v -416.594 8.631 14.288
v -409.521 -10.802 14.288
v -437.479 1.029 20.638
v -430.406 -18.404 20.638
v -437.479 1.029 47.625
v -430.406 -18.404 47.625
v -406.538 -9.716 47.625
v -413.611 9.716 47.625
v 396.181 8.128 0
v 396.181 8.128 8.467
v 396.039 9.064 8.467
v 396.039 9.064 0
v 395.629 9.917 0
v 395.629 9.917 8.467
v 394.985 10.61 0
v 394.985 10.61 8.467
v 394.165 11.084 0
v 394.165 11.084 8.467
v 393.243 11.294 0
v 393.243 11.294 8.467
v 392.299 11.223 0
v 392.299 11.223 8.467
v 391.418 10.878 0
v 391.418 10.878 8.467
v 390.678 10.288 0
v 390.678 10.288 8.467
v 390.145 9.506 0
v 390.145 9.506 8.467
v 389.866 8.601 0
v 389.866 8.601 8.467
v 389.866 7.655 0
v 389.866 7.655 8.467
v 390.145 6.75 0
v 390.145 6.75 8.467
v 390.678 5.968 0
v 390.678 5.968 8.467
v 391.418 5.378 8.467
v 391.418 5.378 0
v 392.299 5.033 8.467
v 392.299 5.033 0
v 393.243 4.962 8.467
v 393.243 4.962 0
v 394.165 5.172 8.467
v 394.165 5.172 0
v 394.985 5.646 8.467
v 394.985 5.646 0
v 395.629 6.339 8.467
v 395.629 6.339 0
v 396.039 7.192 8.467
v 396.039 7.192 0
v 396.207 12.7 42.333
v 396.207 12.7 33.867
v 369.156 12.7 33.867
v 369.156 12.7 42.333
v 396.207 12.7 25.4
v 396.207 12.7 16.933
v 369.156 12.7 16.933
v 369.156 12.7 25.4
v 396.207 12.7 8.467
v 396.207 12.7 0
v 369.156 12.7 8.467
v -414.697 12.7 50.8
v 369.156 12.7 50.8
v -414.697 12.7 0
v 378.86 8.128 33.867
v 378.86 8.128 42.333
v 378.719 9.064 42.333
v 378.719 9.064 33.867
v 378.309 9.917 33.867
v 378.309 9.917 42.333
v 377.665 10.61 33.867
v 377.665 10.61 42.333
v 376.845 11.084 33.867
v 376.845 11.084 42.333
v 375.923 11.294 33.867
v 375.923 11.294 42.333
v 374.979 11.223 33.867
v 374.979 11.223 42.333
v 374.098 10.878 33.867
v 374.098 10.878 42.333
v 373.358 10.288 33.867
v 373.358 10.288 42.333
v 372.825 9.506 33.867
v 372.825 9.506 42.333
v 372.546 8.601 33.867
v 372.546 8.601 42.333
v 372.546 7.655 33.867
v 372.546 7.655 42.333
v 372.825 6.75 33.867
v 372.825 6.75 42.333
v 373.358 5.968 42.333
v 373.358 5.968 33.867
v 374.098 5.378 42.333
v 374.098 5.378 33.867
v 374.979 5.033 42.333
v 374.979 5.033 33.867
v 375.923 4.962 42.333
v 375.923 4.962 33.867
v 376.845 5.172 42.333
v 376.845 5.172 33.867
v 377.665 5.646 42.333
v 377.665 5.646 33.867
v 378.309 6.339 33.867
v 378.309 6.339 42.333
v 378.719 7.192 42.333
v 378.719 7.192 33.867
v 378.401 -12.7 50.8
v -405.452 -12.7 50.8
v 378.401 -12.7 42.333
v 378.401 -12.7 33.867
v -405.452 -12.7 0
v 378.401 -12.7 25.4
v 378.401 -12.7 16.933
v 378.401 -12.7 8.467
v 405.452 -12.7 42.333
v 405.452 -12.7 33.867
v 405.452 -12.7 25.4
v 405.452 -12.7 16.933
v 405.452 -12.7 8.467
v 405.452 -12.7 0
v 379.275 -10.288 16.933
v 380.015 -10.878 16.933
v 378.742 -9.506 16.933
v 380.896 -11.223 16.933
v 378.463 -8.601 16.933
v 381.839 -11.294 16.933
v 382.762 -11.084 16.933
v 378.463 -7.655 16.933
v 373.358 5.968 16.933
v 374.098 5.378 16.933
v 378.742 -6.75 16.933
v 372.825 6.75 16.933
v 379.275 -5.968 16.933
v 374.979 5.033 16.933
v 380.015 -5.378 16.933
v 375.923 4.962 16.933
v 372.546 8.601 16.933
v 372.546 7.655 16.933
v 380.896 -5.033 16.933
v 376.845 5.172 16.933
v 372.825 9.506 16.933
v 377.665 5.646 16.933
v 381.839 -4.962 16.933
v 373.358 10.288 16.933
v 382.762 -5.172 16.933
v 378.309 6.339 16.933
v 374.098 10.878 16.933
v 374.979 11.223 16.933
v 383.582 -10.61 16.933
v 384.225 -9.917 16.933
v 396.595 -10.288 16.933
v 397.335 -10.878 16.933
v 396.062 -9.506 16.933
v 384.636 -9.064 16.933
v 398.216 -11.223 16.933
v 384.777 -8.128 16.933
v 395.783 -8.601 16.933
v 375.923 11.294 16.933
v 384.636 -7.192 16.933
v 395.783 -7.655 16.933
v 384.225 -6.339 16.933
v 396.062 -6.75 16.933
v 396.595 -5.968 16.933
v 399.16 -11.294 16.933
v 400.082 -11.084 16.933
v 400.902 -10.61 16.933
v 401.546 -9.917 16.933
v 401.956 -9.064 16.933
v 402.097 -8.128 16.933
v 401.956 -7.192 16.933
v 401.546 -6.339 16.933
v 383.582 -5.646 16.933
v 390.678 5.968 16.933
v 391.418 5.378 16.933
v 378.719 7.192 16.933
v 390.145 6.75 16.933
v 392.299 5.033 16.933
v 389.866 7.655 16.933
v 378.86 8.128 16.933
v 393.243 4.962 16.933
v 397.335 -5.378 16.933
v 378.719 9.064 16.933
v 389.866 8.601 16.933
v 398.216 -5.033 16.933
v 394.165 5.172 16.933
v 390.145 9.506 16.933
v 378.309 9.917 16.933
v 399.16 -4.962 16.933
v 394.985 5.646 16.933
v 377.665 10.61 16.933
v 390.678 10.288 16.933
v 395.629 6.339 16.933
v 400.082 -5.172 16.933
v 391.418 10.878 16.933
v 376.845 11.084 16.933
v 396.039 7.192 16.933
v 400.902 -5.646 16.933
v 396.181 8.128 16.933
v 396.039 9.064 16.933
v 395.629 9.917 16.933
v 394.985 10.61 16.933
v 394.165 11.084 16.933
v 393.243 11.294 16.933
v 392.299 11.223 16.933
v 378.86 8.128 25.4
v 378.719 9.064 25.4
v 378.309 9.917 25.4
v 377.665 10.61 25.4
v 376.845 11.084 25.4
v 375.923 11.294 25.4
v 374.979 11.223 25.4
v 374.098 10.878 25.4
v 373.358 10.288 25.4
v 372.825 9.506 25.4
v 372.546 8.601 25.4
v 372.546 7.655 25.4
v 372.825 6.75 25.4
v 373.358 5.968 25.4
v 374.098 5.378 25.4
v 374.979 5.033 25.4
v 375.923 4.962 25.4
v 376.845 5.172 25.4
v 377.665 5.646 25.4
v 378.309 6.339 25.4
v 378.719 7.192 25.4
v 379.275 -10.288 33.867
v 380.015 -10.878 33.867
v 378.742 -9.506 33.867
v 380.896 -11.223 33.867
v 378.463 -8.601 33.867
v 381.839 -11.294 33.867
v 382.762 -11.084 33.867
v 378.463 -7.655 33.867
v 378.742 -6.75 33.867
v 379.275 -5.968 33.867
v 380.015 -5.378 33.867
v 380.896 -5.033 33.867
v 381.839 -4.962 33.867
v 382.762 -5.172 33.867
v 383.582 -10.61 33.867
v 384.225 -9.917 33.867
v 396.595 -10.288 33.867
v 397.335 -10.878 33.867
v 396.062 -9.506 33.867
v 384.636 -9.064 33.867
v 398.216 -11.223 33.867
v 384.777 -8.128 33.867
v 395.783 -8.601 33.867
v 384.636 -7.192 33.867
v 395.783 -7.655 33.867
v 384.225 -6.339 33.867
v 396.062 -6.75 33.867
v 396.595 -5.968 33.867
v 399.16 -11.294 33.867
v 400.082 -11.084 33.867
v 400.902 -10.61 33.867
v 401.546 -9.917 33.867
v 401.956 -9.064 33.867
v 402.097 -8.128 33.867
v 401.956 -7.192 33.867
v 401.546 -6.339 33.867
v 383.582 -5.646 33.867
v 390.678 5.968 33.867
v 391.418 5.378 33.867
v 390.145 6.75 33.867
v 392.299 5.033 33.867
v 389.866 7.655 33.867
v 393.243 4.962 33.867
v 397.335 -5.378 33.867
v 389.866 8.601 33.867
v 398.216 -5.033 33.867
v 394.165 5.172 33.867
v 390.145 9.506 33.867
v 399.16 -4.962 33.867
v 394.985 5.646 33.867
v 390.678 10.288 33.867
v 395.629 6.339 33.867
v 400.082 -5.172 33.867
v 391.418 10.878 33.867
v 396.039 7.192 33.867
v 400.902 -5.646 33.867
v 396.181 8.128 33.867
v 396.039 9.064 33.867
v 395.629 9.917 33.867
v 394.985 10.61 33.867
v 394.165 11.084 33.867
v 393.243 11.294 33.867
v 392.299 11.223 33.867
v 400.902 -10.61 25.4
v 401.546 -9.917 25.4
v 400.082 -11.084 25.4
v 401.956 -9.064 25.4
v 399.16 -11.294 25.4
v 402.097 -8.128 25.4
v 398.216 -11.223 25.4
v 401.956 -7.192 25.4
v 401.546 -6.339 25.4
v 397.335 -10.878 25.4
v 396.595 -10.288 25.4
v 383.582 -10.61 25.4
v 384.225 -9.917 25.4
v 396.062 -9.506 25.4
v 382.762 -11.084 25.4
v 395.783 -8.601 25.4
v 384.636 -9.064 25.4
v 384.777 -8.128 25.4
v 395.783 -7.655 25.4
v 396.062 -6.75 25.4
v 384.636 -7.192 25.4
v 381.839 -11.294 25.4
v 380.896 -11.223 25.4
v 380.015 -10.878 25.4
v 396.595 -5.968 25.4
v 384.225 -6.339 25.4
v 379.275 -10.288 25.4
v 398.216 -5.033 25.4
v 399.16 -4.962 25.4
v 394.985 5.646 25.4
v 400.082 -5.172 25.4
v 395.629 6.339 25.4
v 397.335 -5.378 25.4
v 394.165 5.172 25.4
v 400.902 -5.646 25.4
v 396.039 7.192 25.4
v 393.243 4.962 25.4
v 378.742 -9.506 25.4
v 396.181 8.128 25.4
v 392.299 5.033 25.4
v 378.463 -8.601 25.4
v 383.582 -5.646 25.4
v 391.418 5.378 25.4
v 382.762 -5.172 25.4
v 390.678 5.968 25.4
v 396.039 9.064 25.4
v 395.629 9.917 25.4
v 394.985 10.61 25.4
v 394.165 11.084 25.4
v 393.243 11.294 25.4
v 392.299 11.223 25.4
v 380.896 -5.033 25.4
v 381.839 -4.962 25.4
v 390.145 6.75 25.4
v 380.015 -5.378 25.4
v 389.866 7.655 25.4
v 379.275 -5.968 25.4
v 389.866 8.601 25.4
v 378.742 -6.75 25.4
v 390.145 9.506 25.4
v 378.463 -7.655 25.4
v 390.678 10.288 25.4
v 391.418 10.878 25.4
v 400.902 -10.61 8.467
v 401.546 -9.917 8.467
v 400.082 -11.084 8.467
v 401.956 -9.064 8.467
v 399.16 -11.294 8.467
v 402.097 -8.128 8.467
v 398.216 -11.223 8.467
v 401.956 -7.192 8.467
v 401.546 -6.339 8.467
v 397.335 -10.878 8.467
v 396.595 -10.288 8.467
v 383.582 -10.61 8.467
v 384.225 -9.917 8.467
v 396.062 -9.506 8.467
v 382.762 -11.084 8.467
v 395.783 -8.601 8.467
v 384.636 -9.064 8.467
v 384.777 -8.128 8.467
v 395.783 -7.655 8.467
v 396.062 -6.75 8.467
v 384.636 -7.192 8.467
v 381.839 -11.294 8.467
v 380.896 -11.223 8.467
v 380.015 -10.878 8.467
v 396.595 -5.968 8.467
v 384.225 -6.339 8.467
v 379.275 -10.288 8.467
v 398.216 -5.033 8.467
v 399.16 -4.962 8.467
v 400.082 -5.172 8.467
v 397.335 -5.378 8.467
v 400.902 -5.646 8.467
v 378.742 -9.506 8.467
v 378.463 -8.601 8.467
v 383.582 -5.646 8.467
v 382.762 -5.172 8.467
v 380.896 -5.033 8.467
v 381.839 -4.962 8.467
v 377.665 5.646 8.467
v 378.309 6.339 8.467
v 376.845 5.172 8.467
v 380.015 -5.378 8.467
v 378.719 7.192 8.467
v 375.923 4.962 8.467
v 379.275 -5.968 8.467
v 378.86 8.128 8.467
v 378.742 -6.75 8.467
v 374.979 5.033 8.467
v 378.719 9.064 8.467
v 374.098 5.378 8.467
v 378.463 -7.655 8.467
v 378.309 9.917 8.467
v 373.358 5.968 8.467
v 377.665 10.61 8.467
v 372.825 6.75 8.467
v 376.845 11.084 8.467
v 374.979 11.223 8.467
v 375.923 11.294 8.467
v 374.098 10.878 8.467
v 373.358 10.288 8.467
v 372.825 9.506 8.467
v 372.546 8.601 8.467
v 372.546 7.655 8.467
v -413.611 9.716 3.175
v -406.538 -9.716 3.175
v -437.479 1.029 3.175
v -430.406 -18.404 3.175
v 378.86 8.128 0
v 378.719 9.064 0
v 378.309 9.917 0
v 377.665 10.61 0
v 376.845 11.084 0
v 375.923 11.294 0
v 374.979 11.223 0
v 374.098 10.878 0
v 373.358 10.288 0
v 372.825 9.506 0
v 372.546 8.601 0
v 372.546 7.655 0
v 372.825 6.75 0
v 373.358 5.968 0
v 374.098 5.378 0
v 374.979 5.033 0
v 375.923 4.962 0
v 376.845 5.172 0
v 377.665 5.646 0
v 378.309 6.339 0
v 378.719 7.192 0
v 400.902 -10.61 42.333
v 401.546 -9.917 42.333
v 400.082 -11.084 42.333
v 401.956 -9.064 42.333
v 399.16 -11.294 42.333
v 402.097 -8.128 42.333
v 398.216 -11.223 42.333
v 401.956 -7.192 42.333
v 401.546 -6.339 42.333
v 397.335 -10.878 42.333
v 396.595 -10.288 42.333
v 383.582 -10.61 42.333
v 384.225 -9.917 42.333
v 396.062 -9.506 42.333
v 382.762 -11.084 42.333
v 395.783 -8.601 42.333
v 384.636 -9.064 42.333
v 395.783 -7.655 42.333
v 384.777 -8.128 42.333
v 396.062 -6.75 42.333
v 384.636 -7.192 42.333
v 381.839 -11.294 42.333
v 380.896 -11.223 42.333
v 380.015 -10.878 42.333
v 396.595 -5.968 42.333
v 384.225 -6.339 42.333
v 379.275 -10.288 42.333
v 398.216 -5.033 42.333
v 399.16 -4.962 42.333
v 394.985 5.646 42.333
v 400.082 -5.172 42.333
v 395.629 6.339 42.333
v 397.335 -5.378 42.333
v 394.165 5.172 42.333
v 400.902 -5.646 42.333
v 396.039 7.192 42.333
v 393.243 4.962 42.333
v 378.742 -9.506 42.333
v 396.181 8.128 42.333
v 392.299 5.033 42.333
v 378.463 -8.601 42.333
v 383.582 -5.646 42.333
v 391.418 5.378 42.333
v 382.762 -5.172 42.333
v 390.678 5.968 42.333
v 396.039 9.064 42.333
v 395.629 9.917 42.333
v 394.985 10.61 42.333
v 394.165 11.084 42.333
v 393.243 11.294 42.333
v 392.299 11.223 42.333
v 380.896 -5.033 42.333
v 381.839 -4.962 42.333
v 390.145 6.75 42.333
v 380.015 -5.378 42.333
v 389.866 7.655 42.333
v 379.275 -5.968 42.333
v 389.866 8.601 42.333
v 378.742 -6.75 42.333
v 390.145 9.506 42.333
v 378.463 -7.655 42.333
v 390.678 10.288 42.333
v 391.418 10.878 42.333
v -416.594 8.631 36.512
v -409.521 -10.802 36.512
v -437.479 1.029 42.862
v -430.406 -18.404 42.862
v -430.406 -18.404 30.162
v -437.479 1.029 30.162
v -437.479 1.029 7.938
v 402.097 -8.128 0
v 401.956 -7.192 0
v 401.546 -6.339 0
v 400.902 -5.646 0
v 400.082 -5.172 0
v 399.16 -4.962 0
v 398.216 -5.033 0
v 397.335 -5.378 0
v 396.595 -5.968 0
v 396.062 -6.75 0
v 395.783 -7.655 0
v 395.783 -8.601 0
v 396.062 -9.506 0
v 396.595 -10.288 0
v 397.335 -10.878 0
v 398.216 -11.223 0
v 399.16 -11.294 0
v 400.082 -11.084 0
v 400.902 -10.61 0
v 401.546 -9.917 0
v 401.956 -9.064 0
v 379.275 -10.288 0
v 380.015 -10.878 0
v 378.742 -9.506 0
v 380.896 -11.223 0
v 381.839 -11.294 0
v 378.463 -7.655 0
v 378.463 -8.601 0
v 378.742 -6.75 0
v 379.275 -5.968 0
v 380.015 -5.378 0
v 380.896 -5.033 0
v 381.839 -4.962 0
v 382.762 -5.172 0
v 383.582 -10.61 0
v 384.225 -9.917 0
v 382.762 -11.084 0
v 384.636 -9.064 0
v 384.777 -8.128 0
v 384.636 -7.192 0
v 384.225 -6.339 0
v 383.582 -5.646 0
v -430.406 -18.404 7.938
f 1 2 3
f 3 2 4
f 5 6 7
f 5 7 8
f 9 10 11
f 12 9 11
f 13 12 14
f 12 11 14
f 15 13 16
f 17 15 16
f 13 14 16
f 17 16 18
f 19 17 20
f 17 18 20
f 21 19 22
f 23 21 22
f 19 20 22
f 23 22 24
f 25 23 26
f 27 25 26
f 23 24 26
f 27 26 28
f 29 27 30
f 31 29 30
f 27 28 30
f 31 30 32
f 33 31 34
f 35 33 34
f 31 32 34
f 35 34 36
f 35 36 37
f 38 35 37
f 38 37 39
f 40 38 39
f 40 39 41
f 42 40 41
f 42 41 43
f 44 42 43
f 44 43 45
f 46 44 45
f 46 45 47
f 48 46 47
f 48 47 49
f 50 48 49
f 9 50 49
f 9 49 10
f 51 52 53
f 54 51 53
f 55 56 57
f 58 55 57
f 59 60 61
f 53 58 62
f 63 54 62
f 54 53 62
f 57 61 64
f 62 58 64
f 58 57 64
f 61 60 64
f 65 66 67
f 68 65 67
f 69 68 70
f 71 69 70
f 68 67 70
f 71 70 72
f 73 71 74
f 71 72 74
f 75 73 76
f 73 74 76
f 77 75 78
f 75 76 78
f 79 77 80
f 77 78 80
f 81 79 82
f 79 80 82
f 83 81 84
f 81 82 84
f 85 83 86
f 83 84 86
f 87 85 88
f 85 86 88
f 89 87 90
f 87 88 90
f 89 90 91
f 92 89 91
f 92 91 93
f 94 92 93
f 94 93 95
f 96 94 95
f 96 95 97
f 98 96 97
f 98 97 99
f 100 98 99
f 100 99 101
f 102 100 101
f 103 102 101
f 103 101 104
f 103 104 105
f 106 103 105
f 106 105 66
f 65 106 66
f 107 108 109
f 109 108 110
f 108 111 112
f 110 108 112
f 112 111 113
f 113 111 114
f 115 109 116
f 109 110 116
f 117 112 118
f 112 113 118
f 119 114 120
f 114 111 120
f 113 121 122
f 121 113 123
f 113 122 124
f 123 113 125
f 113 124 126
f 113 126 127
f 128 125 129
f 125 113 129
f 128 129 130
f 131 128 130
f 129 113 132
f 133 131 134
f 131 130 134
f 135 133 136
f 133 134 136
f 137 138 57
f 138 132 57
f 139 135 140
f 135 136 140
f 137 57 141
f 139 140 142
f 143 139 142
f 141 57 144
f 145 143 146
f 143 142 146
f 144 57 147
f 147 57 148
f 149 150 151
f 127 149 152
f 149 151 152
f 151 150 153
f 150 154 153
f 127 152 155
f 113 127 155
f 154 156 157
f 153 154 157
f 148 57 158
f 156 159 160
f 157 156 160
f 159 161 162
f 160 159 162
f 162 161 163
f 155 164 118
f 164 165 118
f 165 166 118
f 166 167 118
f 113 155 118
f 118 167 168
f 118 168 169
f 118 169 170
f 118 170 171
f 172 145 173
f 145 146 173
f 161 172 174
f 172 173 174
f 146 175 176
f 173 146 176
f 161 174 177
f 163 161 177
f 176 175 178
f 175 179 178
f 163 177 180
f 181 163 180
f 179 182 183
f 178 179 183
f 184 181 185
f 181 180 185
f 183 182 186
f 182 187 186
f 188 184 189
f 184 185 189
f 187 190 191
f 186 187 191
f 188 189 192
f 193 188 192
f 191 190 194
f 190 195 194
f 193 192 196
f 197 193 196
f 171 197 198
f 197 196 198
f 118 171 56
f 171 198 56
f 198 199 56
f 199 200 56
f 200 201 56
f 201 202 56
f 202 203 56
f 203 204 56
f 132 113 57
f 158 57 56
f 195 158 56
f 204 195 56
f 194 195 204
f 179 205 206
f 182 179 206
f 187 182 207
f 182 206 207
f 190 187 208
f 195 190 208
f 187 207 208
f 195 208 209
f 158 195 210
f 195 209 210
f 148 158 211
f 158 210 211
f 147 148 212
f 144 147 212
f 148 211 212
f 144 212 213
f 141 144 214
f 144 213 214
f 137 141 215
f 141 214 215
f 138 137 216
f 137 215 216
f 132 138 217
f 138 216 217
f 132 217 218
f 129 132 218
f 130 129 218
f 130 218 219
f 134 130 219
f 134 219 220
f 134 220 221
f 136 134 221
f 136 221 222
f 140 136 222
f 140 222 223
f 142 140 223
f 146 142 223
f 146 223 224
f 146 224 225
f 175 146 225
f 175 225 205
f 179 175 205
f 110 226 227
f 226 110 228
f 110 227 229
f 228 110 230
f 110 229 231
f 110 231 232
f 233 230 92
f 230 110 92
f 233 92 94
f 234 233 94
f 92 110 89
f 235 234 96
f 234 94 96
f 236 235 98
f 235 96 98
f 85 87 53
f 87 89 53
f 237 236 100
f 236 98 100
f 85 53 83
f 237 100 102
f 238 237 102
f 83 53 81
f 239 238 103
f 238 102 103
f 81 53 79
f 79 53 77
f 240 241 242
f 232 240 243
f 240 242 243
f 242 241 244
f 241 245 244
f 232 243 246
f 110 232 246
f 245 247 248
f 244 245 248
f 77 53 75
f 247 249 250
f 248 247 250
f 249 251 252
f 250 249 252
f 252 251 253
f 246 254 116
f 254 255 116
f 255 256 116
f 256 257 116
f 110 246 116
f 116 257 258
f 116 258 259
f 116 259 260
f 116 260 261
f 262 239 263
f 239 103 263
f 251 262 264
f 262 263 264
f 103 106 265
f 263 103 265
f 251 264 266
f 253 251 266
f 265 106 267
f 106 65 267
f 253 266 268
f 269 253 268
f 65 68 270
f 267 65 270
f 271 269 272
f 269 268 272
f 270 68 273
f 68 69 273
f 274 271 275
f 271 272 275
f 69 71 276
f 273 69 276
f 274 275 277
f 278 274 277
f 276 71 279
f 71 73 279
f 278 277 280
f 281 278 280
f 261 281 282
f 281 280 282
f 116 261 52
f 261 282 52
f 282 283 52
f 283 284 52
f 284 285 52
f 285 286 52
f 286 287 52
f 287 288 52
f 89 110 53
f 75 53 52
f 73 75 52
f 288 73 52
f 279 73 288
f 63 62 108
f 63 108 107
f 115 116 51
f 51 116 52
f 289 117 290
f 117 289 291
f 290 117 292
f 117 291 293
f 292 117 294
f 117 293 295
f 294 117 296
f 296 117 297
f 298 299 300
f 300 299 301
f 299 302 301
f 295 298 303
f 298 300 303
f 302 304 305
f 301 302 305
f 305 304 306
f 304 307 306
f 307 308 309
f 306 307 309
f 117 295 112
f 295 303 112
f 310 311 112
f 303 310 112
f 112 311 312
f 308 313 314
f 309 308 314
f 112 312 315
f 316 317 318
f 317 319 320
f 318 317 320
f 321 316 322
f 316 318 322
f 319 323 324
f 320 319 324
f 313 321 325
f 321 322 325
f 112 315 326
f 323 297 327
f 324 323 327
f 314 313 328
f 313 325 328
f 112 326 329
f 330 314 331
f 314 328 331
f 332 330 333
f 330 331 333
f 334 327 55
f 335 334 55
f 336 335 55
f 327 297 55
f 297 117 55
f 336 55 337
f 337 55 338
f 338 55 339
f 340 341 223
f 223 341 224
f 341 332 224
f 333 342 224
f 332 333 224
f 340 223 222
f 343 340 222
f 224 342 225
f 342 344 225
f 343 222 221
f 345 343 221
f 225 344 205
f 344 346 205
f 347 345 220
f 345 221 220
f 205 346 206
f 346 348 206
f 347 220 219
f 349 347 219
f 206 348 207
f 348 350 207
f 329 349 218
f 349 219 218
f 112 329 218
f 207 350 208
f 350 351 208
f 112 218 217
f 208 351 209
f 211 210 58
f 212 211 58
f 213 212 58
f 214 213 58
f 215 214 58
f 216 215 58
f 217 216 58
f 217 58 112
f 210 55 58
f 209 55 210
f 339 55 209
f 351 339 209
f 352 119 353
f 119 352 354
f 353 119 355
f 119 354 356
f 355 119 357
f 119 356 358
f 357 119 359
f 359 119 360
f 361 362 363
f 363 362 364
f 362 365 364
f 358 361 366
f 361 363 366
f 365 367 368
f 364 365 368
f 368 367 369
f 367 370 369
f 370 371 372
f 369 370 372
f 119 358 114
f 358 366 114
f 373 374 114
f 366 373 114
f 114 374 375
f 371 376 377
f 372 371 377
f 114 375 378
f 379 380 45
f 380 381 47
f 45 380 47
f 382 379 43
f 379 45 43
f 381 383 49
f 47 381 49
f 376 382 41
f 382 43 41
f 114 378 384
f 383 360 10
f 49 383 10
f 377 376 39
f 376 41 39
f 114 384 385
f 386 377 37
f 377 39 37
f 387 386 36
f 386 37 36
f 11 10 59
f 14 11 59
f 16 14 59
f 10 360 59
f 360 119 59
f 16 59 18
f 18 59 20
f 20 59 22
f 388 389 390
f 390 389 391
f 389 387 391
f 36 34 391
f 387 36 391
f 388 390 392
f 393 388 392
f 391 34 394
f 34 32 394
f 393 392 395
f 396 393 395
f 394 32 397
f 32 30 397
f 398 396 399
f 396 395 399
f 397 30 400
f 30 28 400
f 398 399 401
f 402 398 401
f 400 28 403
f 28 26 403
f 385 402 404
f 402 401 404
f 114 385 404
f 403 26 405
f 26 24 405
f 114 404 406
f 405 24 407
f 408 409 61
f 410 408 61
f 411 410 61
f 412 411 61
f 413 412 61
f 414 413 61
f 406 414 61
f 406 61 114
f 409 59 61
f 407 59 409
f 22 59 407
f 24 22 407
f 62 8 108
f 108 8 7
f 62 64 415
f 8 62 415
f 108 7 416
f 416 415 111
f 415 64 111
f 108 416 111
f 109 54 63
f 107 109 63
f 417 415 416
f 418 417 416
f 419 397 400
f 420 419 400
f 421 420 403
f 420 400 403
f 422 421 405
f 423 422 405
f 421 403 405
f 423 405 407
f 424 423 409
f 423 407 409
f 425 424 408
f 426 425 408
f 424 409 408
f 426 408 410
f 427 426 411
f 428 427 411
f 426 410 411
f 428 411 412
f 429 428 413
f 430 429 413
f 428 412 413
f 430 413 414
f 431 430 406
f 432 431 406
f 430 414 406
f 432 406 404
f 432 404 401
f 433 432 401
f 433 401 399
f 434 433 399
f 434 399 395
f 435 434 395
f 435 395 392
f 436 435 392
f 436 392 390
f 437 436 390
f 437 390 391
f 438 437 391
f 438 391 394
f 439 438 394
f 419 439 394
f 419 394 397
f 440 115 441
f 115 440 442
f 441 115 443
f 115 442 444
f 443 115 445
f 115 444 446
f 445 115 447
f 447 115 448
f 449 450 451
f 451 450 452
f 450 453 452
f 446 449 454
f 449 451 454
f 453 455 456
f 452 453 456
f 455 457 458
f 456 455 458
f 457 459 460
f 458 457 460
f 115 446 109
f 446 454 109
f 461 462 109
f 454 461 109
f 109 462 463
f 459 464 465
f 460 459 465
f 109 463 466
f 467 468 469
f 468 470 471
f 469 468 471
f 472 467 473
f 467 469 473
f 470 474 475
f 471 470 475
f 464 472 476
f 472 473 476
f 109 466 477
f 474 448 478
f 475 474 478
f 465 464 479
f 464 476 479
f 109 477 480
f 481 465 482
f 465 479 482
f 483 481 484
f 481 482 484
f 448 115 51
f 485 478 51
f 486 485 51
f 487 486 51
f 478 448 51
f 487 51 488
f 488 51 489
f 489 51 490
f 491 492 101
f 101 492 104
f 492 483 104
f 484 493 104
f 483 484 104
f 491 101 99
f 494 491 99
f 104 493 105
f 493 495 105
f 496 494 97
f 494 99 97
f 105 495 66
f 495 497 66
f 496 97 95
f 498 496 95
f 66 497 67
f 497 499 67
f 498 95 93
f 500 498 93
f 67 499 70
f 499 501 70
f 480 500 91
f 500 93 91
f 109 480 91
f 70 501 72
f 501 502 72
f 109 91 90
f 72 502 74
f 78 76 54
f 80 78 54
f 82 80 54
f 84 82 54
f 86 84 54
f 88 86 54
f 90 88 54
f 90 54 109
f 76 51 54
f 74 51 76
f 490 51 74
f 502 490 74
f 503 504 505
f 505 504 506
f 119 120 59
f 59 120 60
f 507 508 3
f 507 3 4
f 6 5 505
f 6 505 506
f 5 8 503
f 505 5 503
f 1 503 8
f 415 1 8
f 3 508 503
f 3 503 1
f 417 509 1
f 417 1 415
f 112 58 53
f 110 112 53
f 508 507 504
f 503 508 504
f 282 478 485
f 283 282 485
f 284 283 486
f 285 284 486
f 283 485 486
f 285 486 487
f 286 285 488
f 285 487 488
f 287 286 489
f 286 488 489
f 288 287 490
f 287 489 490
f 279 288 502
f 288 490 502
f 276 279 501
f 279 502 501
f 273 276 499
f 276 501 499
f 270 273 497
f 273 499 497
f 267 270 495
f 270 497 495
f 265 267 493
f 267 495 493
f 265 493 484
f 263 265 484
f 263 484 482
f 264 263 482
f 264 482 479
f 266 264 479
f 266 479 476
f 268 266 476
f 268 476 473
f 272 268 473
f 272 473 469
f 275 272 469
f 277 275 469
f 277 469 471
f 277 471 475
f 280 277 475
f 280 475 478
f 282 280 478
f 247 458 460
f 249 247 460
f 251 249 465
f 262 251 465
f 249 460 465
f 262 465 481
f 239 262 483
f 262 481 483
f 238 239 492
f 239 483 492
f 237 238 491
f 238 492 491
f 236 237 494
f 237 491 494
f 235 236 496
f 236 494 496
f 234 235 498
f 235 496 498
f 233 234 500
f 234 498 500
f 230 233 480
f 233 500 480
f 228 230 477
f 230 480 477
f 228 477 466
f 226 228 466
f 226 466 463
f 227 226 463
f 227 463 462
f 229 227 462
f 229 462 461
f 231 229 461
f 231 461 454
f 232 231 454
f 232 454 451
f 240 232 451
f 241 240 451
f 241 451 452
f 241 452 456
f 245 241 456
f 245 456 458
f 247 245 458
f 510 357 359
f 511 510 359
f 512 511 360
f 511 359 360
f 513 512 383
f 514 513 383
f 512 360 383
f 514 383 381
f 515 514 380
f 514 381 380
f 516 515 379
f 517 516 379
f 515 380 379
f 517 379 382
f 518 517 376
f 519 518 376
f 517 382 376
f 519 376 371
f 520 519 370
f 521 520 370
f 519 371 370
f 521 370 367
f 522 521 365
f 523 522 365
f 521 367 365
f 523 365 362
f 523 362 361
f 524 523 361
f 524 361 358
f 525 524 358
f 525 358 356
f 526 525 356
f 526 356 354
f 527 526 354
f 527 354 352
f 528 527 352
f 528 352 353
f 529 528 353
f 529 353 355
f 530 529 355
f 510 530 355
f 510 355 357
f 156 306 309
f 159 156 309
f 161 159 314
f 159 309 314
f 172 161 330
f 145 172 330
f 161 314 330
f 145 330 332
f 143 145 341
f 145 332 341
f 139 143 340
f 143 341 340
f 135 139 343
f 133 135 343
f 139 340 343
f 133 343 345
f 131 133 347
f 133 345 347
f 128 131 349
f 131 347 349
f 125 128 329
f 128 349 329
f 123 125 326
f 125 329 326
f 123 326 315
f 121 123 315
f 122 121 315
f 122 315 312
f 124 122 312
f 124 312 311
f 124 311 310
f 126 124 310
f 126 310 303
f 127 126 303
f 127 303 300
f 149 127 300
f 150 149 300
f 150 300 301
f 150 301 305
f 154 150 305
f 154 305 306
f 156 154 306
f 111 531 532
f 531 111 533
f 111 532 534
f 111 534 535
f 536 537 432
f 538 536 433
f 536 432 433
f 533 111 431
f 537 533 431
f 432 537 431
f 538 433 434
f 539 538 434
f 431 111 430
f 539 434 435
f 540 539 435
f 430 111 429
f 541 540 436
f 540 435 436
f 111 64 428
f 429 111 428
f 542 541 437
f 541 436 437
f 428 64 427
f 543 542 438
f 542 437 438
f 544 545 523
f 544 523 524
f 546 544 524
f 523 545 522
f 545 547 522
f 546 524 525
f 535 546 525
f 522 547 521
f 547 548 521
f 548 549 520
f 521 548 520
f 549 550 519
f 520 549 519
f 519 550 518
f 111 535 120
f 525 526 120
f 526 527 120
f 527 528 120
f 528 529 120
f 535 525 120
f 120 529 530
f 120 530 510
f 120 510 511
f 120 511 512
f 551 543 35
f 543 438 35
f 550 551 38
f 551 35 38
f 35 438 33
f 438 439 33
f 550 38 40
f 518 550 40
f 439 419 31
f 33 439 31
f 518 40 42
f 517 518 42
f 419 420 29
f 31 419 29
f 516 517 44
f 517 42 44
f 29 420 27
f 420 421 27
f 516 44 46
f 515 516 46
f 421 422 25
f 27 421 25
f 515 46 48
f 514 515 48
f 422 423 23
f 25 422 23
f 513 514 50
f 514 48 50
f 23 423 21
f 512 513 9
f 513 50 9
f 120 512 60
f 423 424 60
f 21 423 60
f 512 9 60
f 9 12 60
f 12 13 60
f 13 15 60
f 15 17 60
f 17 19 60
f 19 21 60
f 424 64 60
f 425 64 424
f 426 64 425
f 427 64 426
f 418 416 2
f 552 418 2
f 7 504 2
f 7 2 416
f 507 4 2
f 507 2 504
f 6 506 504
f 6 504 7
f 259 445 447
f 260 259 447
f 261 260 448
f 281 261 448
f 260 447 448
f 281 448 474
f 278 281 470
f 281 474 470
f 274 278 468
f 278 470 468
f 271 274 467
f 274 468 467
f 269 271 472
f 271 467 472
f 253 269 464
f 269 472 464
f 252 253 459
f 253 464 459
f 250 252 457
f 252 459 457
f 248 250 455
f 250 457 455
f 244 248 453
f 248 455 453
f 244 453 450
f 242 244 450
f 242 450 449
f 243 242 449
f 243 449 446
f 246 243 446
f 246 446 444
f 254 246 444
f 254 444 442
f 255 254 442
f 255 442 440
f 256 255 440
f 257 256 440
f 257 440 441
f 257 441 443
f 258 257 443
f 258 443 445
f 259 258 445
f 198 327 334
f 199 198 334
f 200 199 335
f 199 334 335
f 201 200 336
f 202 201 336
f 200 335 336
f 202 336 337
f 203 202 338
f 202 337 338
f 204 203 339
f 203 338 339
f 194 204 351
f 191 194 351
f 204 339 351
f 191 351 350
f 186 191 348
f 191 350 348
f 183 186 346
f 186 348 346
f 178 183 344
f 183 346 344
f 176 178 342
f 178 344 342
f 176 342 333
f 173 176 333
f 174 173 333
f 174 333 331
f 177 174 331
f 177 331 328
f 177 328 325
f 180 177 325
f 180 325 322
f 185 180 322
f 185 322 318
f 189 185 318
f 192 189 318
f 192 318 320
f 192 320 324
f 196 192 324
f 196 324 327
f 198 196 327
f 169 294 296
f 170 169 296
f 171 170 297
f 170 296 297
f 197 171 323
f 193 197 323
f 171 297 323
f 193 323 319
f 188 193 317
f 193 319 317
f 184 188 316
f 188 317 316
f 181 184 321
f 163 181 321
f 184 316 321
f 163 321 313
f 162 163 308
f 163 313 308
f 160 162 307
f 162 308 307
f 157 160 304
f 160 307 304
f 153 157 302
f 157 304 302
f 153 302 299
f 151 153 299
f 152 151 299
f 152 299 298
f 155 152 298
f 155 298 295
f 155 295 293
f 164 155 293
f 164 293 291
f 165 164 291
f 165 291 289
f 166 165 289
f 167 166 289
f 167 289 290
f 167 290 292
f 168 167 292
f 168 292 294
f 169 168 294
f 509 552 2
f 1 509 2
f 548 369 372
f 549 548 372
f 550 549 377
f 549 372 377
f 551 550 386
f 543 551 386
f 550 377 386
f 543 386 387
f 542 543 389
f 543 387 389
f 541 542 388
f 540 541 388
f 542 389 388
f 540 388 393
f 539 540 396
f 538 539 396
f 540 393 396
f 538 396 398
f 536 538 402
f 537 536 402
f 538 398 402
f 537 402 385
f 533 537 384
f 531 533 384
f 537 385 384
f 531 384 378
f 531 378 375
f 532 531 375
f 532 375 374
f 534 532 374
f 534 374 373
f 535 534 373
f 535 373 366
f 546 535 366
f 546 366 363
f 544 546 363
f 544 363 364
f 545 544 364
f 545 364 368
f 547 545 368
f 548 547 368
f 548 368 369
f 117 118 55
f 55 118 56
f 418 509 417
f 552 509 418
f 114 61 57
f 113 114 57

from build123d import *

# Parameters (mm, degrees)
F1_DEPTH  = 50.8
F2_W      = 27.051
F2_H      = 8.4666666667
F5_W      = 20.6801154209
F5_H      = 44.45
F8_DEPTH  = 31.6481136174
F9_R      = 3.175
F10_DEPTH = 42.3343333333


with BuildPart() as f1:
    # F0 (on Top) → F1 (new body)
    with BuildSketch(Plane.XY):
        Polygon((396.206887363, 12.7), (-414.6965752637, 12.7), (-405.4517313133, -12.7), (405.4517313133, -12.7), align=None)
    extrude(amount=F1_DEPTH)

    # F3: sweep along a path in F3_path
    with BuildLine(Plane(origin=(405.4517313133, -12.7, 50.8), x_dir=(0.3420201433, -0.9396926208, 0), z_dir=(0.9396926208, 0.3420201433, 0))) as f3_path:
        Line((0, 0), (-27.0301154209, 0))
    # F2 (on face) → F3 (sweep, cut)
    with BuildSketch(Plane(origin=(0, 12.7, 0), x_dir=(-1, 0, 0), z_dir=(0, 1, 0))):
        with Locations((-382.681387363, 12.7)):
            Rectangle(F2_W, F2_H)
        with Locations((-382.681387363, 29.6333333333)):
            Rectangle(F2_W, F2_H)
        with Locations((-382.681387363, 46.5666666667)):
            Rectangle(F2_W, F2_H)
    sweep(path=f3_path.line, mode=Mode.SUBTRACT)

    # F6: sweep along a path in F4
    with BuildLine(Plane.XY.offset(50.8)) as f6_path:
        Line((-405.4517313133, -12.7), (-429.3199238813, -21.3873116405))
    # F5 (on face) → F6 (sweep)
    with BuildSketch(Plane(origin=(-362.1045898409, -131.7952923933, 0), x_dir=(0.3420201433, -0.9396926208, 0), z_dir=(-0.9396926208, -0.3420201433, 0))):
        with Locations((-140.2536206819, 25.4)):
            Rectangle(F5_W, F5_H)
    sweep(path=f6_path.line)

    # F7 (on face) → F8 (cut, through all)
    with BuildSketch(Plane(origin=(-44.4330554274, 122.0788164643, 0), x_dir=(0.9396926208, 0.3420201433, 0), z_dir=(0.3420201433, -0.9396926208, 0))):
        Polygon((-388.5186558202, 36.5125), (-410.7436558202, 42.8625), (-410.7436558202, 30.1625), align=None)
        Polygon((-388.5186558202, 14.2875), (-410.7436558202, 20.6375), (-410.7436558202, 7.9375), align=None)
    extrude(amount=-F8_DEPTH, mode=Mode.SUBTRACT)

    # F9 (on face) → F10 (cut, through all)
    with BuildSketch(Plane.XY.offset(42.3333333333)):
        with Locations((393.0055384983, 8.128)):
            Circle(F9_R)
        with Locations((375.6853800498, 8.128)):
            Circle(F9_R)
        with Locations((381.602080178, -8.128)):
            Circle(F9_R)
        with Locations((398.9222386265, -8.128)):
            Circle(F9_R)
    extrude(amount=-F10_DEPTH, mode=Mode.SUBTRACT)


solid = f1.part
